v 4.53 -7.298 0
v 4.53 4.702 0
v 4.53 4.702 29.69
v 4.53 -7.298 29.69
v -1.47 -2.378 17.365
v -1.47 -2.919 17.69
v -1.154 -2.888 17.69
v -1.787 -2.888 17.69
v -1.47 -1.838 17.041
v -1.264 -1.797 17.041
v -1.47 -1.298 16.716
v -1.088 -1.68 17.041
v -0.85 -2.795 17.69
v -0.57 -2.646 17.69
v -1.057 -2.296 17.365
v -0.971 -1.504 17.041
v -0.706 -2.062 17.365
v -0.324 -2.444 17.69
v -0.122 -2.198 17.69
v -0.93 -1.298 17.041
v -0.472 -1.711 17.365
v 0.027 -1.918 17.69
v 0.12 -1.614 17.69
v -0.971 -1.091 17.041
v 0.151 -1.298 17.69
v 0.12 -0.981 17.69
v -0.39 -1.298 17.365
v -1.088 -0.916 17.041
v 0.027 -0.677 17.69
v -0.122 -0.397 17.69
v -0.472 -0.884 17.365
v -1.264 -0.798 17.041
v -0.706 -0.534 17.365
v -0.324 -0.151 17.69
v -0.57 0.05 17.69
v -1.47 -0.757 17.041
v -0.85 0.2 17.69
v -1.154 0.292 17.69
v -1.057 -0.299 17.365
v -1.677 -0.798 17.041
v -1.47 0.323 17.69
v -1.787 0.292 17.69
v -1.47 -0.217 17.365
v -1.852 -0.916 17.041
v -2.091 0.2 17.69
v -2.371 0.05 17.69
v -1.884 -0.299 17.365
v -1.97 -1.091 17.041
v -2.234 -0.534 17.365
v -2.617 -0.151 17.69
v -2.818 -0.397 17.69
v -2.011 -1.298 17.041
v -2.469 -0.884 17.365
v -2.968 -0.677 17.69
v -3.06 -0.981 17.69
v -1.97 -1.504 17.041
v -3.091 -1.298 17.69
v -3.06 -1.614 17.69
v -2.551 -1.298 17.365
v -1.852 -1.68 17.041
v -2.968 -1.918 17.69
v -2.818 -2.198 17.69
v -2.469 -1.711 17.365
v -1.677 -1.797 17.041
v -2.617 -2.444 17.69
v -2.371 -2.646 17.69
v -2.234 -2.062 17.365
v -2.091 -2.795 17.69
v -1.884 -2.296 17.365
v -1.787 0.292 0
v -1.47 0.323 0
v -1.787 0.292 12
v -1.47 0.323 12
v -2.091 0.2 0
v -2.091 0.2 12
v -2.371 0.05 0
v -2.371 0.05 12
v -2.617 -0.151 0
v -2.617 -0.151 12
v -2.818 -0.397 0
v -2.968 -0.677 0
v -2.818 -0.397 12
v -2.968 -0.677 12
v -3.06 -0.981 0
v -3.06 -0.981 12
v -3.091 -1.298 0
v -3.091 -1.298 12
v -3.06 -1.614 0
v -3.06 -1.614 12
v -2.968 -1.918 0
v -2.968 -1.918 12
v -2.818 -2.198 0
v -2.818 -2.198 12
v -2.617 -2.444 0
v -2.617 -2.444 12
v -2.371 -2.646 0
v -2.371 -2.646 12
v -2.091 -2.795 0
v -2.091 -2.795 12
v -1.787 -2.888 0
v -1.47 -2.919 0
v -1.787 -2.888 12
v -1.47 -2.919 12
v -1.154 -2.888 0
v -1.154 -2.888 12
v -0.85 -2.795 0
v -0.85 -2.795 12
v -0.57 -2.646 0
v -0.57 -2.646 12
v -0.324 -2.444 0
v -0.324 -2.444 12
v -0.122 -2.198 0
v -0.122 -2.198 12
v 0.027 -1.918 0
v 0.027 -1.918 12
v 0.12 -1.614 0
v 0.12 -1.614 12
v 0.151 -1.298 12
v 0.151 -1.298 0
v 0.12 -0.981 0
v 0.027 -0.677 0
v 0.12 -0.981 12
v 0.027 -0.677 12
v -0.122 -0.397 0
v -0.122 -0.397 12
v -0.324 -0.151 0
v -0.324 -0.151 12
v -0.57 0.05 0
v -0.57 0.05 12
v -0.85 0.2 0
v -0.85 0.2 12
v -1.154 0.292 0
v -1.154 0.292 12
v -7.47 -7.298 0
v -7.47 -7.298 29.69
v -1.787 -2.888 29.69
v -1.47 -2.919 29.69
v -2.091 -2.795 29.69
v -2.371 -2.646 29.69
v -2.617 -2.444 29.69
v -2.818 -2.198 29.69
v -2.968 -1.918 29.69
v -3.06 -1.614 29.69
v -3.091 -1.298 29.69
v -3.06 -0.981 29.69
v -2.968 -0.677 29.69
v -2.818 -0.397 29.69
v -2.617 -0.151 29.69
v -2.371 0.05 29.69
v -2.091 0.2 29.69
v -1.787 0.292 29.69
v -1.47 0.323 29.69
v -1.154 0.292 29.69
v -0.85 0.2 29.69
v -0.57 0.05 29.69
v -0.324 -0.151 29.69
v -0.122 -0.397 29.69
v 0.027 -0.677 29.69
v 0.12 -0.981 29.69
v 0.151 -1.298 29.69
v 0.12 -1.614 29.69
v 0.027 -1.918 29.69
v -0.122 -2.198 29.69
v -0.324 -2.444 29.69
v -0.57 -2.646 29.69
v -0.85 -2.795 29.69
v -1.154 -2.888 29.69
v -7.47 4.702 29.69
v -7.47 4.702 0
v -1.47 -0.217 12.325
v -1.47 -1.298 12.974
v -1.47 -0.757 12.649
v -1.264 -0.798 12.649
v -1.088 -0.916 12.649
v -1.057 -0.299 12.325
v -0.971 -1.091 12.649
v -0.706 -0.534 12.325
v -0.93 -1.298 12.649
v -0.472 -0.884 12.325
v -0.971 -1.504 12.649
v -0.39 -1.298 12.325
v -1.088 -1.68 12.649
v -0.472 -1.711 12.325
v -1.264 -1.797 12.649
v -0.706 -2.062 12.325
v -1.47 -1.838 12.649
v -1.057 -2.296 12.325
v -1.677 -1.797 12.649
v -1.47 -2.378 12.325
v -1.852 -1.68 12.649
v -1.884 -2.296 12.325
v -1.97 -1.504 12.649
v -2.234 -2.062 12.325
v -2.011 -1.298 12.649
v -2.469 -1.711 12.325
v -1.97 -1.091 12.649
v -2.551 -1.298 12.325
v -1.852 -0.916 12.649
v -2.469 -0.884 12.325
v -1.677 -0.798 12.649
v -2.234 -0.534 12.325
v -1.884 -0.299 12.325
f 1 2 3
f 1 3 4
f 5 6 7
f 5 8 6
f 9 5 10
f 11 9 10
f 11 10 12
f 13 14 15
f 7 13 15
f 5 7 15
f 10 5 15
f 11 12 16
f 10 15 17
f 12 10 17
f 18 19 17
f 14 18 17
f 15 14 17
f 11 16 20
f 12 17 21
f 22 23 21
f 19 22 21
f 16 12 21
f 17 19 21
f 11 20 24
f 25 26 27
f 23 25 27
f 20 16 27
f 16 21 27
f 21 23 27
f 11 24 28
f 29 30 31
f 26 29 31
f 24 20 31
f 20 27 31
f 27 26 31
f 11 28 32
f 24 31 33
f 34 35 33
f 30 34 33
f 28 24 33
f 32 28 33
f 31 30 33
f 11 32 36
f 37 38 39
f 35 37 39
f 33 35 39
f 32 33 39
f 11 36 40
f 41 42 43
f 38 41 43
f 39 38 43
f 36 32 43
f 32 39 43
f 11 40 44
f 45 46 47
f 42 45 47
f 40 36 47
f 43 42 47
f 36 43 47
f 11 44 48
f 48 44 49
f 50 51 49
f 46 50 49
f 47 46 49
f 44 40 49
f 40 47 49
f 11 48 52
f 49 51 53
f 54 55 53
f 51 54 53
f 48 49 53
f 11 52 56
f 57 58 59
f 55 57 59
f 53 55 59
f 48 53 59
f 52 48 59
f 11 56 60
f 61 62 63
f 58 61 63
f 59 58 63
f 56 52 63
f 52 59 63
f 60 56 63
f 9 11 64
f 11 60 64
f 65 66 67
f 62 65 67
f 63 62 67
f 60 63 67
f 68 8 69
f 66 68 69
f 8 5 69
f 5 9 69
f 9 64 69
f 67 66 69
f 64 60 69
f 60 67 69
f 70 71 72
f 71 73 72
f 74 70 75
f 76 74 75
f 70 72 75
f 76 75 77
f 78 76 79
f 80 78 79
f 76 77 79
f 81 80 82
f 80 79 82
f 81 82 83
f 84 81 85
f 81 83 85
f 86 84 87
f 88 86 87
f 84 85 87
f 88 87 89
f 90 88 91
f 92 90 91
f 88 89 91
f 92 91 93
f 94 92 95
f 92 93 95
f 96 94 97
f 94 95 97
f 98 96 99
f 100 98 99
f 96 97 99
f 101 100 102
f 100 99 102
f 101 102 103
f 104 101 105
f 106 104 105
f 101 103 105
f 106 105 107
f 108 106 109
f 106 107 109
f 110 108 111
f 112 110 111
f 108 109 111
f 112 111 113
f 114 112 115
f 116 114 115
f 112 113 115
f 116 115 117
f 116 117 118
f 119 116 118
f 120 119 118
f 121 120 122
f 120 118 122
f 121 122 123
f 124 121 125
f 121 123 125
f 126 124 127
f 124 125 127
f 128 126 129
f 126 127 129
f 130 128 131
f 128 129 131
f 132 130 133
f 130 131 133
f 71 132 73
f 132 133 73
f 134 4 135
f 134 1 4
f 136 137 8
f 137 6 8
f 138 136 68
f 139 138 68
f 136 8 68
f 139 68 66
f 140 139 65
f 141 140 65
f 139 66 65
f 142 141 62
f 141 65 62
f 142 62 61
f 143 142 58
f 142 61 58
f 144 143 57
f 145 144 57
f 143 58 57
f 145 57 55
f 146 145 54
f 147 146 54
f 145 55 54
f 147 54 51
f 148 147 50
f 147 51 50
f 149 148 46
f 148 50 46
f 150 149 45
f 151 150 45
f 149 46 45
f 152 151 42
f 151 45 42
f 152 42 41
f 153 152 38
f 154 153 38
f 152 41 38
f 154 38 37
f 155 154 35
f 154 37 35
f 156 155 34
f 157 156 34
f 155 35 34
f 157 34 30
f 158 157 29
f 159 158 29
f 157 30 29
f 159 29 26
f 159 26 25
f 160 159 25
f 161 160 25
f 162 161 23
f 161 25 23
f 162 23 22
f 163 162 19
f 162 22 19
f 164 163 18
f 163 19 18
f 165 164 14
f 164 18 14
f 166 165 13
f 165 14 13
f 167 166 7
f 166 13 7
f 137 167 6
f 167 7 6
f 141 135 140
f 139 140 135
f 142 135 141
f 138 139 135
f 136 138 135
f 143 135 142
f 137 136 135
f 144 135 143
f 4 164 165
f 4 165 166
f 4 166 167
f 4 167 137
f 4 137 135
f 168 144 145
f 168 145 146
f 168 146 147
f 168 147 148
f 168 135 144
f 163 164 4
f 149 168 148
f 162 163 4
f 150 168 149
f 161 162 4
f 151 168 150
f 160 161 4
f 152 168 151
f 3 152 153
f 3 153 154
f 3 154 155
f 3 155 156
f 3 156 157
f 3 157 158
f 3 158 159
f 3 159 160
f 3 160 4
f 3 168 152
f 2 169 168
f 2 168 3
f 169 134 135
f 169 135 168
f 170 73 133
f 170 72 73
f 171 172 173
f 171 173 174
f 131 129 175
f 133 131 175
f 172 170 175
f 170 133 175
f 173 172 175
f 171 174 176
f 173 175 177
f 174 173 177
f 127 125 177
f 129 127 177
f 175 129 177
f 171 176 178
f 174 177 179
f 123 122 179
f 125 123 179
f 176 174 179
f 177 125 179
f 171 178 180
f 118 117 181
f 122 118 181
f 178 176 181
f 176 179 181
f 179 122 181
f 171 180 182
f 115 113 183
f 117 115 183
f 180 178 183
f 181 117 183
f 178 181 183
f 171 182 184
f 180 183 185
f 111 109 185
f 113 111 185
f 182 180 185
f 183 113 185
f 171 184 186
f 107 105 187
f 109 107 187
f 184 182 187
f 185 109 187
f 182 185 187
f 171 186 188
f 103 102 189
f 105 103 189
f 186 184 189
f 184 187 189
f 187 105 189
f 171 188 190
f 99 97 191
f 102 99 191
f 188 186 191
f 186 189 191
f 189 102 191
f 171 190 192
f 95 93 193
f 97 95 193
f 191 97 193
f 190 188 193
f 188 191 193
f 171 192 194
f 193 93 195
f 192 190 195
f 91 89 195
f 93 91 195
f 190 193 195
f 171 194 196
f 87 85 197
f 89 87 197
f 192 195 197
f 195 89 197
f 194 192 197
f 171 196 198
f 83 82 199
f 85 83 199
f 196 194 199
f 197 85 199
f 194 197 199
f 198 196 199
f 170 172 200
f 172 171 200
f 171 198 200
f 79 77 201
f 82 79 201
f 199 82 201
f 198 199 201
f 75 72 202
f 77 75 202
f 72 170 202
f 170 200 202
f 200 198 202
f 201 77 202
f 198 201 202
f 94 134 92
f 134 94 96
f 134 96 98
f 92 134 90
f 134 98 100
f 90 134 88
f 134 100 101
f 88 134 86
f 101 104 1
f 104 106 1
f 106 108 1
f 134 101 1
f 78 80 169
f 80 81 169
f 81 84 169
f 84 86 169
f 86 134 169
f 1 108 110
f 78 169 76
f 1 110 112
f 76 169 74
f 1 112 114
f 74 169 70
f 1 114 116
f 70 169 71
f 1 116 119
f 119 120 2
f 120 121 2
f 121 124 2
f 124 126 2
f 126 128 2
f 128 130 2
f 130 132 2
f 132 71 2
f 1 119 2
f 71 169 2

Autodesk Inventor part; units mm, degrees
ref_plane "YZ Plane" through (0, 0, 0) normal (1, 0, 0) x (0, 1, 0)
ref_plane "XZ Plane" through (0, 0, 0) normal (0, 1, 0) x (-1, 0, 0)
sketch "Esboço1" plane through (0, 0, 0) normal (0, 0, 1) x (1, 0, 0)
  line L0 (4.9347, -7.2977) -> (-6.5153, -7.2977) projected
  line L1 (4.9347, -7.2977) -> (4.9347, 10.1323) projected
  line L2 (4.9347, 10.1323) -> (2.5947, 10.1323) projected
  line L3 (2.5947, 10.1323) -> (-0.1453, 0.6423) projected
  line L4 (-0.1453, 0.6423) -> (-0.1453, -1.2977) projected
  arc A0 (-2.7953, -1.2977) -> (-0.1453, -1.2977) centre (-1.4703, -1.2977) ccw projected
  line L5 (-2.7953, -1.2977) -> (-2.7953, 2.6323) projected
  line L6 (-2.7953, 2.6323) -> (-6.5153, 2.6323) projected
  line L7 (-6.5153, 2.6323) -> (-6.5153, -7.2977) projected
  line L8 (-7.4703, 4.7023) -> (4.5297, 4.7023)
  line L9 (4.5297, 4.7023) -> (4.5297, -7.2977)
  line L10 (4.5297, -7.2977) -> (-7.4703, -7.2977)
  line L11 (-7.4703, -7.2977) -> (-7.4703, 4.7023)
  line L12 (-7.4703, 4.7023) -> (4.5297, -7.2977) construction
  line L13 (4.5297, 4.7023) -> (-7.4703, -7.2977) construction
  point P0 (0, 0)
  dimension "d0" = 12
  dimension "d1" = 12
ref_plane "Plano de trabalho1" through (-14.4853, -144.1477, 29.69) normal (0, 0, -1) x (0, 1, 0)
extrude "Extrusão1" add sketch "Esboço1" along normal up to surface (29.69 mm away) contours L0 L7 L6 L5 A0 L4 L3 L8 L9 | L10 L11 L8 L3 L4 A0 L5 L6 L7
sketch "Esboço3" plane through (0, 0, 0) normal (0, 0, -1) x (-1, 0, 0)
  line L0 (-4.5297, 4.7023) -> (7.4703, 4.7023) projected
  line L1 (7.4703, -7.2977) -> (-4.5297, -7.2977) projected
  line L2 (-4.5297, -7.2977) -> (-4.5297, 4.7023) construction
  line L3 (-4.5297, 4.7023) -> (7.4703, -7.2977) construction
  line L4 (7.4703, 4.7023) -> (-4.5297, -7.2977) construction
  circle A0 centre (1.4703, -1.2977) radius 3 construction
  dimension "d13" = 6
hole "Furo2" at (-1.4703, -1.2977, 0) direction (0, 0, 1) diameter 3.242 depth 12 tip angle 118 thread size "M4x0.7" class "6H" standard "ISO Metric profile"
sketch "Esboço5" plane through (-7.4703, 4.7023, 29.69) normal (0, 0, 1) x (1, 0, 0)
  circle A0 centre (6, -6) radius 1.621 projected
  circle A1 centre (6, -6) radius 3.7537 construction
hole "Furo3" at (-1.4703, -1.2977, 29.69) direction (0, 0, -1) diameter 3.242 depth 12 tip angle 118 thread size "M4x0.7" class "6H" standard "ISO Metric profile"
properties part number "espassador_soprador" material "Alumínio 6061"
